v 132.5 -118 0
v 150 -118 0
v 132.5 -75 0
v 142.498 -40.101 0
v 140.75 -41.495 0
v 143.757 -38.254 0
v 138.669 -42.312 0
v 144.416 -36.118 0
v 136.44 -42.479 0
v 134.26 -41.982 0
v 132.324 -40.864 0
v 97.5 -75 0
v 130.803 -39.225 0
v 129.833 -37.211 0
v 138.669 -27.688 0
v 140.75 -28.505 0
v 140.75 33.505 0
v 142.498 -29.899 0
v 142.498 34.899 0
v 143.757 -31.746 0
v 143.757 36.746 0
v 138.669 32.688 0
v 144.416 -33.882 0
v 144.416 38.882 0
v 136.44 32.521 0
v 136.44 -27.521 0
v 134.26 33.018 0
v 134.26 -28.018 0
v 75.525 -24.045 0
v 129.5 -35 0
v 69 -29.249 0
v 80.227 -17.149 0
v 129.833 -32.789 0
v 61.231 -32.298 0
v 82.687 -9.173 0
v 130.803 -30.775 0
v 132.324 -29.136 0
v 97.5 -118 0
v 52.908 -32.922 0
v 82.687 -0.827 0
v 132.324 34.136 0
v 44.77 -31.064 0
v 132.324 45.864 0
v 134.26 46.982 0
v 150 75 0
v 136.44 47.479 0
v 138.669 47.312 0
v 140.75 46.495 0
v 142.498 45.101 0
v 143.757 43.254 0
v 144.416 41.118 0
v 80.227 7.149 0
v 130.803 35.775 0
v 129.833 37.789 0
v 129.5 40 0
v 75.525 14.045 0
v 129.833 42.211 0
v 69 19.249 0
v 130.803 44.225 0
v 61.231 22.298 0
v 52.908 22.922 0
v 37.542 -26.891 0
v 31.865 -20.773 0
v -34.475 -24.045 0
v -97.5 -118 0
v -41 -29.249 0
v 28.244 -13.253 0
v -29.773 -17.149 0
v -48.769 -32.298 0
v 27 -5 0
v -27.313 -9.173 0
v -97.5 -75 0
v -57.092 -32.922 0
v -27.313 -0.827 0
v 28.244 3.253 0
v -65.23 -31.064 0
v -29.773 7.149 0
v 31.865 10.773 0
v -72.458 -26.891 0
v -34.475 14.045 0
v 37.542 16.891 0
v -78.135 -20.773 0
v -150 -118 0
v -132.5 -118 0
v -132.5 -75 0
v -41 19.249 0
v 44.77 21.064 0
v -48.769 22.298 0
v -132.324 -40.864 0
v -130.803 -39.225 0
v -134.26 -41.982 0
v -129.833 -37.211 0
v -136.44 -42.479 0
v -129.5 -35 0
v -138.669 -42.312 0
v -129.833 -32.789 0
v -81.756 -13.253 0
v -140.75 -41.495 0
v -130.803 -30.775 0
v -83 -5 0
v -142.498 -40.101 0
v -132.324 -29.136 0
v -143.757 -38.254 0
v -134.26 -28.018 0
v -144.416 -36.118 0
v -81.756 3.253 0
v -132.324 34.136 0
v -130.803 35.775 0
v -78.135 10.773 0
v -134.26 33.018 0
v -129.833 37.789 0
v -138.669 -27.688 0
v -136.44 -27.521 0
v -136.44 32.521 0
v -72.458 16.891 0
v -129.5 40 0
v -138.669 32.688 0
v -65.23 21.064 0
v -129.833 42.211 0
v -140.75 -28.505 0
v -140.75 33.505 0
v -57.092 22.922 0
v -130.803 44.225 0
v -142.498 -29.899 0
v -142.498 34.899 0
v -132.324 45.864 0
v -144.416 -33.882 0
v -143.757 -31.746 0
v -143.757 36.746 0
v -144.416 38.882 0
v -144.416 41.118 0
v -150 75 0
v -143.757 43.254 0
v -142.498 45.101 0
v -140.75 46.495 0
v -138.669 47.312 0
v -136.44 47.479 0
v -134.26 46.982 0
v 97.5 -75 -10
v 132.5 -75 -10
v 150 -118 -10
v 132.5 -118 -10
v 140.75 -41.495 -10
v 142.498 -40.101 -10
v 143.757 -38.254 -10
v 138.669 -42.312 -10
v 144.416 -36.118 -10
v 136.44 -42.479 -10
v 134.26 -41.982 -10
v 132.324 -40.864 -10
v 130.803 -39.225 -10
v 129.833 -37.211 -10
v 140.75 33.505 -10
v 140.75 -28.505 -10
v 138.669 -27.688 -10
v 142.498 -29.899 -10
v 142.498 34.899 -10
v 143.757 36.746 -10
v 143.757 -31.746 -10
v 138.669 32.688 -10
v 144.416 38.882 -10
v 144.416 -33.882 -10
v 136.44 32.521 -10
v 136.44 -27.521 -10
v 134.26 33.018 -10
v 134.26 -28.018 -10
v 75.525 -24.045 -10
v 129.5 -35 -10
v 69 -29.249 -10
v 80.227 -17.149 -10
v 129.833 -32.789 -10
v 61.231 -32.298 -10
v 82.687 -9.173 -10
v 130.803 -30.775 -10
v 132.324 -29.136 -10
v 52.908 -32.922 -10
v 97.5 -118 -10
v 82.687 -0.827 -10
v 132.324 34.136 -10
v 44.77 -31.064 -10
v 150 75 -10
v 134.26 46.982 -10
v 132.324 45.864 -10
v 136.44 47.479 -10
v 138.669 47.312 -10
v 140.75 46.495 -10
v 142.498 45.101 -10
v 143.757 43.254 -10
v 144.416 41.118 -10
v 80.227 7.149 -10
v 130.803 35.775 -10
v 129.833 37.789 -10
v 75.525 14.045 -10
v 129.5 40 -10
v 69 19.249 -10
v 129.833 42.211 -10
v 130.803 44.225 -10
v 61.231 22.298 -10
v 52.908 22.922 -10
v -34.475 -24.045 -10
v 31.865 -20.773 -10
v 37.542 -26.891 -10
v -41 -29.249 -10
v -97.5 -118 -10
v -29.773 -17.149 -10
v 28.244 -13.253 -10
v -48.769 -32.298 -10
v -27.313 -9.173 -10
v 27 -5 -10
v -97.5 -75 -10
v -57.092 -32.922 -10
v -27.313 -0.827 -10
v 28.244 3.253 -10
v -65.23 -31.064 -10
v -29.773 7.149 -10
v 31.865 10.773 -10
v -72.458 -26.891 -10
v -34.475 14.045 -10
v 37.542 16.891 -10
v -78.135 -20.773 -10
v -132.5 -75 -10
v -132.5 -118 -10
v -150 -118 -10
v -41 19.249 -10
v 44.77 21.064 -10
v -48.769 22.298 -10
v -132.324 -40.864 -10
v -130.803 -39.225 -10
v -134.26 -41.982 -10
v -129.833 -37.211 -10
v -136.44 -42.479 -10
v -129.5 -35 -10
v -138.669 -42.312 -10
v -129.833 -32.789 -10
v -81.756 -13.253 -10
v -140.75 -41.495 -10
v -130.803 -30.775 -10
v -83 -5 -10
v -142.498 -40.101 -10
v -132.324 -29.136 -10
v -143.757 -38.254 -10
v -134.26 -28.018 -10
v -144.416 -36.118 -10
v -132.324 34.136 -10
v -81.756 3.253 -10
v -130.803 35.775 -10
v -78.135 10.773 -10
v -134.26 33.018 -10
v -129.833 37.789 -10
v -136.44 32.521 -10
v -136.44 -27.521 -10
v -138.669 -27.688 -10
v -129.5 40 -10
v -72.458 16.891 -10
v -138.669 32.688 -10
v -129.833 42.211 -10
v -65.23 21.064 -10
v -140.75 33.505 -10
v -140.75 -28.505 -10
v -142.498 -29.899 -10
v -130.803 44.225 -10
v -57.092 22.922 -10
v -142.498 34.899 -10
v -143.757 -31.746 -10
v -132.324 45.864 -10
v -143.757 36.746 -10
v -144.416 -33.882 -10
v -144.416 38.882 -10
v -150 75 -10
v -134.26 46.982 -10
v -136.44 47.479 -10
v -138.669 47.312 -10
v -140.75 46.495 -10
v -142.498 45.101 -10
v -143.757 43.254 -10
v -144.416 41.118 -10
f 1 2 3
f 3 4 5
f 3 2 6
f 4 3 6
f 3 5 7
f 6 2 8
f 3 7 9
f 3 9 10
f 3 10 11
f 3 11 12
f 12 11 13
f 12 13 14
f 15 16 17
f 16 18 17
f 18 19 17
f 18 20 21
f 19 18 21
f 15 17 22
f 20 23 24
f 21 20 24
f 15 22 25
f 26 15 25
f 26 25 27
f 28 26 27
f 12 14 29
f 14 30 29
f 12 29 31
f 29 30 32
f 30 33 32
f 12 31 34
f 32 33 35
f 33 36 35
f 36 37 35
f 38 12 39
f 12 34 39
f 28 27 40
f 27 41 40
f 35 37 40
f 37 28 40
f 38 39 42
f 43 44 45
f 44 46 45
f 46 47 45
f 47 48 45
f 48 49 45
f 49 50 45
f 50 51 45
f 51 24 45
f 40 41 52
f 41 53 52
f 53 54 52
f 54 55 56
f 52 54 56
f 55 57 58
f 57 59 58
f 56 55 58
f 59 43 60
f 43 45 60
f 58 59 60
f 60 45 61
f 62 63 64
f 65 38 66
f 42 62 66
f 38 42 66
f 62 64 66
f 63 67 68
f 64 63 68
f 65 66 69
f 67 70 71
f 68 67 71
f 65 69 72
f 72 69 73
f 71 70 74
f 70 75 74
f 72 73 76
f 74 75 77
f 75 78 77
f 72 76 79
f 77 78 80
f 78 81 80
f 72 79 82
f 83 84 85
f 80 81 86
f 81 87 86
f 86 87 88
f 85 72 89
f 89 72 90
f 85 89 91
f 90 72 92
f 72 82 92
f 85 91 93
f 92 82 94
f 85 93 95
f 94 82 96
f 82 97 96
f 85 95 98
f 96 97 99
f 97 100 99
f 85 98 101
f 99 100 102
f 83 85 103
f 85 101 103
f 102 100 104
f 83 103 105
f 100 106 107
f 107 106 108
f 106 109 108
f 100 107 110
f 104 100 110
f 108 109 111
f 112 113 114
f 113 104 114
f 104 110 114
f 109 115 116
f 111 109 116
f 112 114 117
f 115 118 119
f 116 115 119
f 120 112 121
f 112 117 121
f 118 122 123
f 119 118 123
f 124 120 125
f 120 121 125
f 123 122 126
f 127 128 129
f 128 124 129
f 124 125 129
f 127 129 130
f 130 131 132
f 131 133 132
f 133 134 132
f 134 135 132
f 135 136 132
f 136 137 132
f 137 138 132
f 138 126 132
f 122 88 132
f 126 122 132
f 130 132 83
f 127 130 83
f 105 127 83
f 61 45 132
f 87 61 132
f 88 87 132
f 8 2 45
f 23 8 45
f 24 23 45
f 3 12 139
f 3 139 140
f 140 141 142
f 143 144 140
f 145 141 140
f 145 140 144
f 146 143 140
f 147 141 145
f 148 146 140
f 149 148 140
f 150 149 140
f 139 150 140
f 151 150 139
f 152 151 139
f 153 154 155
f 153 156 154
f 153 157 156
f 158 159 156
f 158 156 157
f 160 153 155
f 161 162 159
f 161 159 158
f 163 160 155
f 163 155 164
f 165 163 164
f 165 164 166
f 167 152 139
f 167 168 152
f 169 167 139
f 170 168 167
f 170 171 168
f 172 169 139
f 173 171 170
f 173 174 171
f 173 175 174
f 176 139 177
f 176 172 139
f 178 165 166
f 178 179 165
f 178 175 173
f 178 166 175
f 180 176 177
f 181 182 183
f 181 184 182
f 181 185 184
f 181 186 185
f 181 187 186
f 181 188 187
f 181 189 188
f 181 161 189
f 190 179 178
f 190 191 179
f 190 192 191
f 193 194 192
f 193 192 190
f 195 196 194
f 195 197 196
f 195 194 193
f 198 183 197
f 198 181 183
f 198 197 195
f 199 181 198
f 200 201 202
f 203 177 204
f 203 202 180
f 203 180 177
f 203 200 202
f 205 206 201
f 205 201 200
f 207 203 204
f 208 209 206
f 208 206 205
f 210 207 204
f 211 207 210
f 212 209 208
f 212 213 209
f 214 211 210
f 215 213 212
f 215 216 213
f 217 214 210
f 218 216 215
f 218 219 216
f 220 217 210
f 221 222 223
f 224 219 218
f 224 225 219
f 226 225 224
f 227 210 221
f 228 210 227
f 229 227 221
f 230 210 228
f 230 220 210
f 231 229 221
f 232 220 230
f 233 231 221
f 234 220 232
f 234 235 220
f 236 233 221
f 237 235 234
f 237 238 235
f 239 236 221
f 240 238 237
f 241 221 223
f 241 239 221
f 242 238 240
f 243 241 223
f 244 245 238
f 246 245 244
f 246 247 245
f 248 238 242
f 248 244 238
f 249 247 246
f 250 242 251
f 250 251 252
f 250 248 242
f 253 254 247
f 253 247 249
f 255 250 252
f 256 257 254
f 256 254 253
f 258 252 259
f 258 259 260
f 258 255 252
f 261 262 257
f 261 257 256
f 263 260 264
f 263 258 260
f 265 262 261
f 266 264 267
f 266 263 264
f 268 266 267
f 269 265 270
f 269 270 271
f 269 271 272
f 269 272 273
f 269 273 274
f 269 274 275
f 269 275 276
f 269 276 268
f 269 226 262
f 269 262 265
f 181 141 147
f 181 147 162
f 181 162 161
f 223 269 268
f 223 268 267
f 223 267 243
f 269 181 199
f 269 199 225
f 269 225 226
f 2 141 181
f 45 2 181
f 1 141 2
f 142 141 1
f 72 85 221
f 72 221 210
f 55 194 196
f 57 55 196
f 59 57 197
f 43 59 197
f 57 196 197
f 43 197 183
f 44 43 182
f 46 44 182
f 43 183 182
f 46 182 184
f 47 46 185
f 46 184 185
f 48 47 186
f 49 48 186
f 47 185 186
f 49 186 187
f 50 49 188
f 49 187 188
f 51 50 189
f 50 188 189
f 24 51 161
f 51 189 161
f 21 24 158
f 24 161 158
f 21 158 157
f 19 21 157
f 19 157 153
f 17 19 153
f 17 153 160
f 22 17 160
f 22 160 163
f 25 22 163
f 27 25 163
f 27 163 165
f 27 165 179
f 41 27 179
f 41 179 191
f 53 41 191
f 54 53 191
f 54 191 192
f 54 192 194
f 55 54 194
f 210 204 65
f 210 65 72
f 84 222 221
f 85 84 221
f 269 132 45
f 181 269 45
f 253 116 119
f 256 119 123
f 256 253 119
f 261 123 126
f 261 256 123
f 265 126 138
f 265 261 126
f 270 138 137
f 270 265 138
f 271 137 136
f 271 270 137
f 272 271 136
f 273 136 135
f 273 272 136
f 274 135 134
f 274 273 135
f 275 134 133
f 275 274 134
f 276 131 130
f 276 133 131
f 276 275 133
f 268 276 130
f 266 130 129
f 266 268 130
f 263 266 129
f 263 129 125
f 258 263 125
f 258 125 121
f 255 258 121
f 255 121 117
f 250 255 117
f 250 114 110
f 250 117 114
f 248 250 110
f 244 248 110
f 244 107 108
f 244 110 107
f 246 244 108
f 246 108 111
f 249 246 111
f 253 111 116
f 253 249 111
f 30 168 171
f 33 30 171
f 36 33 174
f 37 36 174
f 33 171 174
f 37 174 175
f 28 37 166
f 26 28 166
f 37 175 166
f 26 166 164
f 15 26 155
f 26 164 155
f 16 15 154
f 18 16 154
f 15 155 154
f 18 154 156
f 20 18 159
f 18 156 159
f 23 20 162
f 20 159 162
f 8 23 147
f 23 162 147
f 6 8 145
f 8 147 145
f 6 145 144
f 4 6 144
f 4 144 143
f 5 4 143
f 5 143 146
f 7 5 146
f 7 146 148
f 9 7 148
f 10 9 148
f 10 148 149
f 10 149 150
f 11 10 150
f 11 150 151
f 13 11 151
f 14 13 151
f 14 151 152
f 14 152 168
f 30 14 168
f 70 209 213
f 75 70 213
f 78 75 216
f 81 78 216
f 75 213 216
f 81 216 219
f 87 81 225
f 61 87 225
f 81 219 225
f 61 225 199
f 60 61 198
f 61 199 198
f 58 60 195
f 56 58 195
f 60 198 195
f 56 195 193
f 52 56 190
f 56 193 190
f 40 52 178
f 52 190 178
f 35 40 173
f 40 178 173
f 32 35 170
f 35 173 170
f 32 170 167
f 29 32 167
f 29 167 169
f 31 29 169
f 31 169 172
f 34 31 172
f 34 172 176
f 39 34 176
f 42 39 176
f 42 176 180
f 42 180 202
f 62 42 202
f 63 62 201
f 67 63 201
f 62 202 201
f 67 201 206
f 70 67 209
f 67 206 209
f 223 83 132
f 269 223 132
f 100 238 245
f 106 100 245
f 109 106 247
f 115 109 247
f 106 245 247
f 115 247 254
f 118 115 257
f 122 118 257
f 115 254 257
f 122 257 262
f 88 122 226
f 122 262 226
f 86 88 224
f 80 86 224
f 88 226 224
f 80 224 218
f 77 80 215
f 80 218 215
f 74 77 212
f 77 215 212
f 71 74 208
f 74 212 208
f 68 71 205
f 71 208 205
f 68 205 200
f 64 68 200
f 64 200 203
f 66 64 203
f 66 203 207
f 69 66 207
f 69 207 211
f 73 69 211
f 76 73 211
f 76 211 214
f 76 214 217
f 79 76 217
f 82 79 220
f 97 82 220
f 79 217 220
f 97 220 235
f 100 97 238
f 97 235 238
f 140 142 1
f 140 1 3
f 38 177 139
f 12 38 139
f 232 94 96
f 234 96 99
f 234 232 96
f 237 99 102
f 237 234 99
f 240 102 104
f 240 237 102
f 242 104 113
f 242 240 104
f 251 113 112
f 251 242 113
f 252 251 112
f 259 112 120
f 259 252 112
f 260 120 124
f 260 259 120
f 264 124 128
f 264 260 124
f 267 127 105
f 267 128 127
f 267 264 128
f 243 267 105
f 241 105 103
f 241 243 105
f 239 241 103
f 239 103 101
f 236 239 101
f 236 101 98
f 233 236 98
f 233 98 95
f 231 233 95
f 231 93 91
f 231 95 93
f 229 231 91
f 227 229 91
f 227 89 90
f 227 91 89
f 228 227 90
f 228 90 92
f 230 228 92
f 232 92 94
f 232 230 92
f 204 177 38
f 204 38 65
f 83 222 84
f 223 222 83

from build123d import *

# Parameters (mm, degrees)
IZIM1_W               = 300
IZIM1_H               = 150
TABAN_FLAN_1_DEPTH    = 10
IZIM6_R               = 28
KES_EKSTR_ZYON1_DEPTH = 10
IZIM7_R               = 7.5
KES_EKSTR_ZYON2_DEPTH = 15
IZIM8_W               = 17.5
IZIM8_H               = 43
IZIM8_W_2             = 195
SEKME1_DEPTH          = 10


# Sheet-metal steps are written as plain solids
with BuildPart() as part:
    # Çizim1 → Taban-Flanş1 (new body)
    with BuildSketch(Plane.XY):
        Rectangle(IZIM1_W, IZIM1_H)
    extrude(amount=-TABAN_FLAN_1_DEPTH)

    # Çizim6 → Kes-Ekstrüzyon1 (cut)
    with BuildSketch(Plane(origin=(0, 0, -10), x_dir=(-1, 0, 0), z_dir=(0, 0, -1))):
        with Locations((-55, -5)):
            Circle(IZIM6_R)
        with Locations((55, -5)):
            Circle(IZIM6_R)
    extrude(amount=-KES_EKSTR_ZYON1_DEPTH, mode=Mode.SUBTRACT)

    # Çizim7 → Kes-Ekstrüzyon2 (cut)
    with BuildSketch(Plane(origin=(0, 0, -10), x_dir=(-1, 0, 0), z_dir=(0, 0, -1))):
        with Locations((-137, 40)):
            Circle(IZIM7_R)
        with Locations((-137, -35)):
            Circle(IZIM7_R)
    kes_ekstr_zyon2 = extrude(amount=-KES_EKSTR_ZYON2_DEPTH, mode=Mode.SUBTRACT)

    # Aynalama1: Kes-Ekstrüzyon2 across plane
    add(kes_ekstr_zyon2.mirror(Plane(origin=(0, 0, 0), x_dir=(0, 0, 1), z_dir=(1, 0, 0))), mode=Mode.SUBTRACT)

    # Çizim8 → Sekme1 (add)
    with BuildSketch(Plane(origin=(0, 0, -10), x_dir=(-1, 0, 0), z_dir=(0, 0, -1))):
        with Locations((-141.25, -96.5)):
            Rectangle(IZIM8_W, IZIM8_H)
        with Locations((0, -96.5)):
            Rectangle(IZIM8_W_2, IZIM8_H)
        with Locations((141.25, -96.5)):
            Rectangle(IZIM8_W, IZIM8_H)
    extrude(amount=-SEKME1_DEPTH)


solid = part.part
